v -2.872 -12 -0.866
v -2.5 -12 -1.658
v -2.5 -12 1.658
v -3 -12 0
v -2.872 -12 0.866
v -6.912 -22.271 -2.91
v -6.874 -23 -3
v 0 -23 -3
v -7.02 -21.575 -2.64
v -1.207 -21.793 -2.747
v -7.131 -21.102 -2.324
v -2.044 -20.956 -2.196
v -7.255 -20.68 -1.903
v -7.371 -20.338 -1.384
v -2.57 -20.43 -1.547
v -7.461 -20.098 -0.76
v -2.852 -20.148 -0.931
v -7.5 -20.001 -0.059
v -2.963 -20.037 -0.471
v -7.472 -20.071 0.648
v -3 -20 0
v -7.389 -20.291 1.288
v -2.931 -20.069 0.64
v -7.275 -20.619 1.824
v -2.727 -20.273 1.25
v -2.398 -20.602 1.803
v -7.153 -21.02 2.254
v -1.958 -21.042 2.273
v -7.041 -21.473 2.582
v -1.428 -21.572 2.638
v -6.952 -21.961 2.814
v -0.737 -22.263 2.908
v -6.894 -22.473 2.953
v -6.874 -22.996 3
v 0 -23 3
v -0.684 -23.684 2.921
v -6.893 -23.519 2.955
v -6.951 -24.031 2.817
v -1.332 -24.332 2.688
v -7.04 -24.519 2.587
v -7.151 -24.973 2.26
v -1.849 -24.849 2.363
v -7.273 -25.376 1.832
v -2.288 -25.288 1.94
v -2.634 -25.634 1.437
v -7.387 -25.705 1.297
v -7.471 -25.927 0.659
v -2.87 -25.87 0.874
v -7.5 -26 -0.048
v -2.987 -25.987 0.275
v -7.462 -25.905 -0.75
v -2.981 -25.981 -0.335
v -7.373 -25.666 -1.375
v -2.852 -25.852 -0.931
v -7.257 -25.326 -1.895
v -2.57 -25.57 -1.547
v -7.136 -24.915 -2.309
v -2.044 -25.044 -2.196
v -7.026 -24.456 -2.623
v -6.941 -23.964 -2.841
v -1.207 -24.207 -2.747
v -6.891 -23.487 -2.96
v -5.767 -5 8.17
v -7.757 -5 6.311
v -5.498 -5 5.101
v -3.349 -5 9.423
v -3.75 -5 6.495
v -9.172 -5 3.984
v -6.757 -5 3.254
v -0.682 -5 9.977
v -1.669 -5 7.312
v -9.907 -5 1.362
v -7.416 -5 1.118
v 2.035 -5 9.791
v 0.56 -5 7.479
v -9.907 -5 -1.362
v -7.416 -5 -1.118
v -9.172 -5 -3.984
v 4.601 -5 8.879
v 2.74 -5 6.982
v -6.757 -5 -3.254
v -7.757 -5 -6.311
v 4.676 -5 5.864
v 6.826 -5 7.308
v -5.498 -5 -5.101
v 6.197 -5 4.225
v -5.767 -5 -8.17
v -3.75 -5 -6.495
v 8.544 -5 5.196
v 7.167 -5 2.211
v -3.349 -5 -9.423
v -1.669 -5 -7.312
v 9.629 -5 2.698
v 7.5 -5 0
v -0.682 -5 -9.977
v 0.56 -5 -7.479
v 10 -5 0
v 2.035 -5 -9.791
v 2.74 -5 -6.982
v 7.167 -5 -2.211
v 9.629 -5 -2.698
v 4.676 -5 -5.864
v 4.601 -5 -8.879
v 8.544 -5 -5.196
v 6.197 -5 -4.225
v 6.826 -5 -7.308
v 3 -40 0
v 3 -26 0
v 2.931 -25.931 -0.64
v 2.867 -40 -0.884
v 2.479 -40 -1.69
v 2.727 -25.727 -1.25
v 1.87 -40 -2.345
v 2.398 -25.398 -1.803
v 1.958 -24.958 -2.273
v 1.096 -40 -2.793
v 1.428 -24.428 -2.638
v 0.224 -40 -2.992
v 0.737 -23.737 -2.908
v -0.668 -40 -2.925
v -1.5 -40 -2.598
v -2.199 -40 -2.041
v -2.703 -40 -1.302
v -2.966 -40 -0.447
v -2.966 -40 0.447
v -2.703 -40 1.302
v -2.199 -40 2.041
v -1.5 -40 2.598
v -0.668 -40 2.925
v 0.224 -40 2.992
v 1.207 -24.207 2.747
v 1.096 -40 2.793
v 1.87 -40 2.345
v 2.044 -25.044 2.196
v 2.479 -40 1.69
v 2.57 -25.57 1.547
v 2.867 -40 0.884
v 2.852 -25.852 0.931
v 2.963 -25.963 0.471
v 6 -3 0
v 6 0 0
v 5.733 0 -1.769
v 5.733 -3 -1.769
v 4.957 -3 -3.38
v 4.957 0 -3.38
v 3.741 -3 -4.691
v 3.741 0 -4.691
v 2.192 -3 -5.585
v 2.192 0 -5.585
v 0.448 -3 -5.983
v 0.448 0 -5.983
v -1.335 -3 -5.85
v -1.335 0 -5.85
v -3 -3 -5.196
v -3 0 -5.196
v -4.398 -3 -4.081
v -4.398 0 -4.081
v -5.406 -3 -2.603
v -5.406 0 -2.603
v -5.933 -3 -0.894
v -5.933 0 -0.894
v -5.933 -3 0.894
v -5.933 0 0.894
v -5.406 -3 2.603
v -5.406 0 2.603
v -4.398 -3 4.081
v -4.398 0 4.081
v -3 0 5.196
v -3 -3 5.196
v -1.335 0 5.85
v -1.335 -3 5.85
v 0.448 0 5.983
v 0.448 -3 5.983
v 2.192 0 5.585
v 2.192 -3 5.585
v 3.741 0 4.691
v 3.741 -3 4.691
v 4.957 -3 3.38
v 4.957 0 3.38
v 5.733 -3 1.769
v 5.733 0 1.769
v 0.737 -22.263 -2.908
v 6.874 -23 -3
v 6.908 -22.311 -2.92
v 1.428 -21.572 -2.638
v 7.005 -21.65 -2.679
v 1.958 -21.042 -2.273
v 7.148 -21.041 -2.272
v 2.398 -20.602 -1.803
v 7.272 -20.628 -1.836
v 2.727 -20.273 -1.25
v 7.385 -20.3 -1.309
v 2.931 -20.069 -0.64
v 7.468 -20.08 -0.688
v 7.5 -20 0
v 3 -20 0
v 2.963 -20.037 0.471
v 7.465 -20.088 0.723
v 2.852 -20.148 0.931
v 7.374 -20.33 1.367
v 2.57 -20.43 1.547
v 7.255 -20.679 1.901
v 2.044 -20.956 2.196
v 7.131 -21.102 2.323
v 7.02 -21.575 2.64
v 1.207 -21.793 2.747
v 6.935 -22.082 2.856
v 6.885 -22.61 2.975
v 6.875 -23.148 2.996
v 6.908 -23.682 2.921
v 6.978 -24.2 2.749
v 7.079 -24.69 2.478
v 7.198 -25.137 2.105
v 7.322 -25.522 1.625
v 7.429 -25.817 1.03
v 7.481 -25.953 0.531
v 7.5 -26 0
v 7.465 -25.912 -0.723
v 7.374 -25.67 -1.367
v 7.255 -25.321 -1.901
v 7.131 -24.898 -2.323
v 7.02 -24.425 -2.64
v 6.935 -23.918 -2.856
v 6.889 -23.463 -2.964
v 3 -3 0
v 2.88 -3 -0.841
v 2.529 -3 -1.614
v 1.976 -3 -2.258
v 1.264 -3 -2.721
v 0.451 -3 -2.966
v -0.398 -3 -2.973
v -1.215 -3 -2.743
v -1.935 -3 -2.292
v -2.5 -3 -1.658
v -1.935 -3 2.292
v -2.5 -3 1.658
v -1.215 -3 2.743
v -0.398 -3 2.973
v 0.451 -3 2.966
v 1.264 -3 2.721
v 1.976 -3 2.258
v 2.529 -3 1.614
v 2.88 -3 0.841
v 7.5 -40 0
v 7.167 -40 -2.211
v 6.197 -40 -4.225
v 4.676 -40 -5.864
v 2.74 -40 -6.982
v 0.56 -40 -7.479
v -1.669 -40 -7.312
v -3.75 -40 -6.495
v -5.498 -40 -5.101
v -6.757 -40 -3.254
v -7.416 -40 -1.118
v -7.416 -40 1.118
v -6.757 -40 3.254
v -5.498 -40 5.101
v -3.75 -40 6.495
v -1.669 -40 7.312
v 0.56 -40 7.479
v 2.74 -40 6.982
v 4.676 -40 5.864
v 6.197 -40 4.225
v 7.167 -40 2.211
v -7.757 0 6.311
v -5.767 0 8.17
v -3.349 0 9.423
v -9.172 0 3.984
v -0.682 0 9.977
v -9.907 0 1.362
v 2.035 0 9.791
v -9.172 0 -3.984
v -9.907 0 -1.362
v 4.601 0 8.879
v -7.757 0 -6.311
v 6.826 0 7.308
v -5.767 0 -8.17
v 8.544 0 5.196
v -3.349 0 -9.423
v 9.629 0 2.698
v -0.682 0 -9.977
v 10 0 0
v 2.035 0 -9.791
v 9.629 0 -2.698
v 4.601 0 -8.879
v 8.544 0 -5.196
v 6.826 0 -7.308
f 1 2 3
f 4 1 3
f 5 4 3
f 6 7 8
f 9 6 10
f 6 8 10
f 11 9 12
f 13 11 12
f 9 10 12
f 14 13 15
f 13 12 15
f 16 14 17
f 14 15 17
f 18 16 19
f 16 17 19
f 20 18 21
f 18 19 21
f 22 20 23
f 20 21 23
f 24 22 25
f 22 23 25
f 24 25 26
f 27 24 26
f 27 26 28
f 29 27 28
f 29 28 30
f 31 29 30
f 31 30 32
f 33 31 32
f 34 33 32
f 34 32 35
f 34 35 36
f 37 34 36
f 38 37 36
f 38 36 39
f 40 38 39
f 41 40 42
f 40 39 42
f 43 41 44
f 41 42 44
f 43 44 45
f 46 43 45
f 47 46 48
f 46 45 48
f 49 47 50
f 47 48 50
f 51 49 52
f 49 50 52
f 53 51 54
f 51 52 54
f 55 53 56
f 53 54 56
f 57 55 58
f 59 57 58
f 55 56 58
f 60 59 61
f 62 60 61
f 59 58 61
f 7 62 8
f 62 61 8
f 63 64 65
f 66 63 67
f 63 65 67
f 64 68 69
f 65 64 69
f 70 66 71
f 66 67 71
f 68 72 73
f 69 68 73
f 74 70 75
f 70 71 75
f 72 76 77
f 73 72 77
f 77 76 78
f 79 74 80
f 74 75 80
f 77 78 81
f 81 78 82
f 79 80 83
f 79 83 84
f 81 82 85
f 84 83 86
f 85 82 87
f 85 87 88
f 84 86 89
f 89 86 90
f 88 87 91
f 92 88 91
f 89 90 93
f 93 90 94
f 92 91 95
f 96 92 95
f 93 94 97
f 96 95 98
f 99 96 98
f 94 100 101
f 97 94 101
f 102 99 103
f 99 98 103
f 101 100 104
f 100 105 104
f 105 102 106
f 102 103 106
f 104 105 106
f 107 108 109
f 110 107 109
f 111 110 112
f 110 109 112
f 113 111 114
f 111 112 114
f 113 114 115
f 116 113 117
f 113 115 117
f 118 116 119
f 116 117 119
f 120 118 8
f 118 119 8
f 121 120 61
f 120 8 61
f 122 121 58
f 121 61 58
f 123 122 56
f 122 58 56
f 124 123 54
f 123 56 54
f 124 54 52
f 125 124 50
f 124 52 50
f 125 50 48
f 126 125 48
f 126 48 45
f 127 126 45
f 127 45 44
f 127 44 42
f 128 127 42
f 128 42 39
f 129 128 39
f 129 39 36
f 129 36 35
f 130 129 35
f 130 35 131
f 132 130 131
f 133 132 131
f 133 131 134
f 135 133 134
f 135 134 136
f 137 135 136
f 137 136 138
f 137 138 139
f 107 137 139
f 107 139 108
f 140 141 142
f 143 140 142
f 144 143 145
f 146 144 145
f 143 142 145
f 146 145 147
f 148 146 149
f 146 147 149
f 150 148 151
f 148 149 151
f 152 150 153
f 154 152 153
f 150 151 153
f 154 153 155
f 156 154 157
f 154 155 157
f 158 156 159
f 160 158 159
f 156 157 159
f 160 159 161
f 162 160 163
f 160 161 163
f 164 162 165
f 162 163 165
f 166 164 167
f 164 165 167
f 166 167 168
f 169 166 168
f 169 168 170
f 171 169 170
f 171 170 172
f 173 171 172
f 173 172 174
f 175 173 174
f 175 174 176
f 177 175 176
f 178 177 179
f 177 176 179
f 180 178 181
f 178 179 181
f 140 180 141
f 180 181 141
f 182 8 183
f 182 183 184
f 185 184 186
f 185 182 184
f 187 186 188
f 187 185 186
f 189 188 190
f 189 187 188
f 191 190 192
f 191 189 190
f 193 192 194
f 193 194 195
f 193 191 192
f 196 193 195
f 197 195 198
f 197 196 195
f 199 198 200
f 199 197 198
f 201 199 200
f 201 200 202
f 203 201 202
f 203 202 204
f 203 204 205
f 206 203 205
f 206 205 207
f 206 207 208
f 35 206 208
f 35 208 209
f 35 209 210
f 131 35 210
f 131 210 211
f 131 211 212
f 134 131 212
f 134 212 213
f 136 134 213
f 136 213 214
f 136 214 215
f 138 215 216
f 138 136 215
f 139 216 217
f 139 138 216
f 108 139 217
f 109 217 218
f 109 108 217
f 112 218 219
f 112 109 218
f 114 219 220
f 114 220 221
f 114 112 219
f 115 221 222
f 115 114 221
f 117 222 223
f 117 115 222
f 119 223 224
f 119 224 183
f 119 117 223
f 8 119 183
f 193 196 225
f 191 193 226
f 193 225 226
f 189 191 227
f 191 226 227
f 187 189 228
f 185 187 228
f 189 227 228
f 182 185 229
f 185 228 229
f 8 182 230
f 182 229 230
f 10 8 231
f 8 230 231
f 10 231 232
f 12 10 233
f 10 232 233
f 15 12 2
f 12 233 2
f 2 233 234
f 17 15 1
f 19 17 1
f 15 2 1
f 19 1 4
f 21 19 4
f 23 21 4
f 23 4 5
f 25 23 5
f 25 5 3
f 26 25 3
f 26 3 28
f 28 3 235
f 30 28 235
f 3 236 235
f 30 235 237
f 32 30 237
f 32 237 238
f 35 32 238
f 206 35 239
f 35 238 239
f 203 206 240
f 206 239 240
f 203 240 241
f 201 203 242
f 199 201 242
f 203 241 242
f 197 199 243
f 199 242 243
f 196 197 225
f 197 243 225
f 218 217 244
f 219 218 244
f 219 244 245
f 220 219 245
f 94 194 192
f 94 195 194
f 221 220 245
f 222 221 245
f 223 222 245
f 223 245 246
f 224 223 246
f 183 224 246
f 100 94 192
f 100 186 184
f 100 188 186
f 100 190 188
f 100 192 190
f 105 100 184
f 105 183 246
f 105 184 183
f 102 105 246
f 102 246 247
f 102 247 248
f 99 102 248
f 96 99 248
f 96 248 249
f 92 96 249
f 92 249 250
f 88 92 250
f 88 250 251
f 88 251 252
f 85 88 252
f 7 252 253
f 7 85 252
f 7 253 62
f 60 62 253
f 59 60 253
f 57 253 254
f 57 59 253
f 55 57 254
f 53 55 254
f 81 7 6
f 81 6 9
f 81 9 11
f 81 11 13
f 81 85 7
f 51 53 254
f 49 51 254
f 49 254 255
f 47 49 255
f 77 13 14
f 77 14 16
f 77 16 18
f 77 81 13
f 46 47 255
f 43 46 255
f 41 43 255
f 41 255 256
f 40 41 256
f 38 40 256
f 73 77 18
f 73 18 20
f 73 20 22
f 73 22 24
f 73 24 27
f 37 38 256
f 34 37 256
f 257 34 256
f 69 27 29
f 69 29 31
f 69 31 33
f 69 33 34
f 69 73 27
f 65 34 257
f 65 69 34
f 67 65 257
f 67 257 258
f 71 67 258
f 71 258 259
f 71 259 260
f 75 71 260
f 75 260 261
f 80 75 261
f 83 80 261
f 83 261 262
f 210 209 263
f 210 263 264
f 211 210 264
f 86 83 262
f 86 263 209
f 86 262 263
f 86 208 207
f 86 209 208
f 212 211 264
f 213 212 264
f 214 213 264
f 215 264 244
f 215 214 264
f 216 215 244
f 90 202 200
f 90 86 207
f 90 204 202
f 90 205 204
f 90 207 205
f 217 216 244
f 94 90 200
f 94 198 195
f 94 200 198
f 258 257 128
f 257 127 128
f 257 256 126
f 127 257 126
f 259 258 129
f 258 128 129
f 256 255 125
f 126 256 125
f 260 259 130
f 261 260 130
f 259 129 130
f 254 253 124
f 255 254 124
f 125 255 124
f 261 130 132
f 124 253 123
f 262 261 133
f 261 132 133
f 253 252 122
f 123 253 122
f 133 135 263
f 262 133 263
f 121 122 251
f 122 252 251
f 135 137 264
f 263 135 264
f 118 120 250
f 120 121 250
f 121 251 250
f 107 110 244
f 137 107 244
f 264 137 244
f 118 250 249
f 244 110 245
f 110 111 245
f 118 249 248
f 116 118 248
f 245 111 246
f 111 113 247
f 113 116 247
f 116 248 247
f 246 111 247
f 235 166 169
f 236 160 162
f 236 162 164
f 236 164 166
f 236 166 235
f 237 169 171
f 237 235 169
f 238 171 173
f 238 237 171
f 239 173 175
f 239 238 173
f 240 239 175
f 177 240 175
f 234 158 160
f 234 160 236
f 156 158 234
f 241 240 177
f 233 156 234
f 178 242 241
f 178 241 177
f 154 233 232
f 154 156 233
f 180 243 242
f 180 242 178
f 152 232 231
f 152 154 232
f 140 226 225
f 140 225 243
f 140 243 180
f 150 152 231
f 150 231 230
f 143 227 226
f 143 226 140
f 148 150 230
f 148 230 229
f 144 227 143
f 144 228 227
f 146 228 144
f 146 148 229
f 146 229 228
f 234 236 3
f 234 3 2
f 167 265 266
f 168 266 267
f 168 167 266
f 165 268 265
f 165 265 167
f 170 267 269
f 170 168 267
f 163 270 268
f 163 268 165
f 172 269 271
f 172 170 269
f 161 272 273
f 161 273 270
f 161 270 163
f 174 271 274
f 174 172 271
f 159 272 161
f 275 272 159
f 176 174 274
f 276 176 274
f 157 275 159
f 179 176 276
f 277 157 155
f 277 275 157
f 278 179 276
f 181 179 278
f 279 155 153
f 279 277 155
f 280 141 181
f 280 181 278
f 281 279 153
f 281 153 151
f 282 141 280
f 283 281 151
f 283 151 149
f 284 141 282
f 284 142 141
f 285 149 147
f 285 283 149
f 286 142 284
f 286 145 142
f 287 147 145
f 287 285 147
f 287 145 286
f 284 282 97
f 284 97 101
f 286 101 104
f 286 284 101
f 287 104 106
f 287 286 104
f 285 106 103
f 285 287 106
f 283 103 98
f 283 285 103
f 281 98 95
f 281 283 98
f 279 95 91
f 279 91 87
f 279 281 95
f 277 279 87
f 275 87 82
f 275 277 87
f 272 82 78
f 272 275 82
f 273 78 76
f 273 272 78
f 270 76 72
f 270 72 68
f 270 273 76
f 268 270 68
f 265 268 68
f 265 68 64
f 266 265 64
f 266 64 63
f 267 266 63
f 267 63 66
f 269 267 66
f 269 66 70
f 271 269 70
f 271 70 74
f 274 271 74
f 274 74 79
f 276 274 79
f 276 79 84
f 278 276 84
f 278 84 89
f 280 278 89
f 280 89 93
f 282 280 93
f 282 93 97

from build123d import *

# Parameters (mm, degrees)
SKETCH1_R                   = 10
METALSTOCK_DEPTH            = 40
EXTERIORLATHE_START         = -5
SKETCH2_OUTSIDE_W           = 31.798
SKETCH2_OUTSIDE_H           = 31.798
SKETCH2_OUTSIDE_R           = 7.5
EXTERIORLATHE_DEPTH         = 35
SKETCH6_R                   = 3
SHAFTHOLE_FOR_GEARBOX_DEPTH = 41
SKETCH7_W                   = 2
SKETCH7_H                   = 6
KEY_FOR_GEARBOX_DEPTH       = 12
SKETCH8_R                   = 3
SIDESCREWHOLE_DEPTH         = 11
SIDESCREWHOLE_DEPTH_BACK    = 11
SKETCH9_R                   = 6
GEARBOXCOUNTERSINK_DEPTH    = 3


with BuildPart() as part:
    # Sketch1 → MetalStock (new body)
    with BuildSketch(Plane(origin=(0, 0, 0), x_dir=(1, 0, 0), z_dir=(0, 1, 0))):
        Circle(SKETCH1_R)
    extrude(amount=-METALSTOCK_DEPTH)

    # Sketch2 outside → ExteriorLathe (cut)
    with BuildSketch(Plane(origin=(0, 0, 0), x_dir=(1, 0, 0), z_dir=(0, 1, 0)).offset(EXTERIORLATHE_START)):
        Rectangle(SKETCH2_OUTSIDE_W, SKETCH2_OUTSIDE_H)
        Circle(SKETCH2_OUTSIDE_R, mode=Mode.SUBTRACT)
    extrude(amount=-EXTERIORLATHE_DEPTH, mode=Mode.SUBTRACT)

    # Sketch6 → ShaftHole for Gearbox (cut, through all)
    with BuildSketch(Plane(origin=(0, 0, 0), x_dir=(1, 0, 0), z_dir=(0, 1, 0))):
        Circle(SKETCH6_R)
    extrude(amount=-SHAFTHOLE_FOR_GEARBOX_DEPTH, mode=Mode.SUBTRACT)

    # Sketch7 → Key for Gearbox (add)
    with BuildSketch(Plane(origin=(0, 0, 0), x_dir=(1, 0, 0), z_dir=(0, 1, 0))):
        with Locations((-3.5, 0)):
            Rectangle(SKETCH7_W, SKETCH7_H)
    extrude(amount=-KEY_FOR_GEARBOX_DEPTH)

    # Sketch8 → SideScrewHole (cut, two sides)
    with BuildSketch(Plane(origin=(0, 0, 0), x_dir=(0, 0, -1), z_dir=(1, 0, 0))) as sidescrewhole_sk:
        with Locations((0, -23)):
            Circle(SKETCH8_R)
    extrude(amount=SIDESCREWHOLE_DEPTH, mode=Mode.SUBTRACT)
    extrude(sidescrewhole_sk.sketch, amount=-SIDESCREWHOLE_DEPTH_BACK, mode=Mode.SUBTRACT)

    # Sketch9 → GearboxCounterSink (cut)
    with BuildSketch(Plane(origin=(0, 0, 0), x_dir=(1, 0, 0), z_dir=(0, 1, 0))):
        Circle(SKETCH9_R)
    extrude(amount=-GEARBOXCOUNTERSINK_DEPTH, mode=Mode.SUBTRACT)


solid = part.part
